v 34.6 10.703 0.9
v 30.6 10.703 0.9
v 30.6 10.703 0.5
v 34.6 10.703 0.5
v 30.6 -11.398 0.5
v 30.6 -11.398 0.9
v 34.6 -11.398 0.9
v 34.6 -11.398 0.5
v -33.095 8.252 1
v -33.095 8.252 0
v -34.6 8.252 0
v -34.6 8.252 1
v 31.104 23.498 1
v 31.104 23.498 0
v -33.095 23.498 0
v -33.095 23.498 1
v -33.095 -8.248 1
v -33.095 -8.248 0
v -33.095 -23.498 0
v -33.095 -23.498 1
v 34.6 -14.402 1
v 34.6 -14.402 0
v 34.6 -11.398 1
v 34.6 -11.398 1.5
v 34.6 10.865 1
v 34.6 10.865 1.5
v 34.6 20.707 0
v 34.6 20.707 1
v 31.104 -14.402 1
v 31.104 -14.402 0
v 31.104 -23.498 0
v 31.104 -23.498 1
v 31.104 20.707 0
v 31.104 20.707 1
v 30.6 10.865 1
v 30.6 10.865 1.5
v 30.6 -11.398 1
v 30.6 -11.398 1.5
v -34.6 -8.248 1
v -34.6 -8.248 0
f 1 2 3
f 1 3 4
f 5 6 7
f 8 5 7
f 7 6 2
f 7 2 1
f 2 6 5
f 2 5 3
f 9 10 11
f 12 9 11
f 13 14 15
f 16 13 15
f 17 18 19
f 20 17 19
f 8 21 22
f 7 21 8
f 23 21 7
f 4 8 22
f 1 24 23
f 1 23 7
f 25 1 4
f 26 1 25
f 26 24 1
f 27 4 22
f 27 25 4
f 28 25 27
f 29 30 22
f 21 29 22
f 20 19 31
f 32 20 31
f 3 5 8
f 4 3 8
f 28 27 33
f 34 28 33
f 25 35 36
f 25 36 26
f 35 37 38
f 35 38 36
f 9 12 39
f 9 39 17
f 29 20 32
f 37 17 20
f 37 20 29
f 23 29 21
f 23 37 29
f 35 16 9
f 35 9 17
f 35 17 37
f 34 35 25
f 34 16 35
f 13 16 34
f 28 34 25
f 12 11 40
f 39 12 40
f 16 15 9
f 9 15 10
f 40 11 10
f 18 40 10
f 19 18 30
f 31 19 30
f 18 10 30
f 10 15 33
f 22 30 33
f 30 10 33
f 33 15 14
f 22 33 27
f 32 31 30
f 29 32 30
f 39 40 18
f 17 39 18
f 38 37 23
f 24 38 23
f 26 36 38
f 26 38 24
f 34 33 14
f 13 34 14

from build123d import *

# Parameters (mm, degrees)
BOSS_EXTRU_1_DEPTH      = 1
ESQUISSE2_W             = 4
ESQUISSE2_H             = 22.100446083
ENL_V_MAT_EXTRU_2_DEPTH = 0.5
ESQUISSE3_W             = 4
ESQUISSE3_H             = 22.262802535
BOSS_EXTRU_2_DEPTH      = 0.5
BOSS_EXTRU_2_DEPTH_BACK = 0.1


with BuildPart() as part:
    # Esquisse1 → Boss.-Extru.1 (new body)
    with BuildSketch(Plane.XY):
        Polygon((34.6, 20.706521175), (31.104320123, 20.706521175), (31.104320123, 23.497793163), (-33.095389285, 23.497793163), (-33.095389285, 8.252206837), (-34.510836618, 8.252206837), (-34.6, 8.252206837), (-34.6, -8.247793163), (-33.095389285, -8.247793163), (-33.095389285, -23.497793163), (31.104320123, -23.497793163), (31.104320123, -14.402052139), (34.6, -14.402052139), align=None)
    extrude(amount=BOSS_EXTRU_1_DEPTH)

    # Esquisse2 → Enlèv. mat.-Extru.2 (cut)
    with BuildSketch(Plane.XY.offset(1)):
        with Locations((32.6, -0.347632361)):
            Rectangle(ESQUISSE2_W, ESQUISSE2_H)
    extrude(amount=-ENL_V_MAT_EXTRU_2_DEPTH, mode=Mode.SUBTRACT)

    # Esquisse3 → Boss.-Extru.2 (add, two sides)
    with BuildSketch(Plane.XY.offset(1)) as boss_extru_2_sk:
        with Locations((32.6, -0.266454134)):
            Rectangle(ESQUISSE3_W, ESQUISSE3_H)
    extrude(amount=BOSS_EXTRU_2_DEPTH)
    extrude(boss_extru_2_sk.sketch, amount=-BOSS_EXTRU_2_DEPTH_BACK)


solid = part.part
